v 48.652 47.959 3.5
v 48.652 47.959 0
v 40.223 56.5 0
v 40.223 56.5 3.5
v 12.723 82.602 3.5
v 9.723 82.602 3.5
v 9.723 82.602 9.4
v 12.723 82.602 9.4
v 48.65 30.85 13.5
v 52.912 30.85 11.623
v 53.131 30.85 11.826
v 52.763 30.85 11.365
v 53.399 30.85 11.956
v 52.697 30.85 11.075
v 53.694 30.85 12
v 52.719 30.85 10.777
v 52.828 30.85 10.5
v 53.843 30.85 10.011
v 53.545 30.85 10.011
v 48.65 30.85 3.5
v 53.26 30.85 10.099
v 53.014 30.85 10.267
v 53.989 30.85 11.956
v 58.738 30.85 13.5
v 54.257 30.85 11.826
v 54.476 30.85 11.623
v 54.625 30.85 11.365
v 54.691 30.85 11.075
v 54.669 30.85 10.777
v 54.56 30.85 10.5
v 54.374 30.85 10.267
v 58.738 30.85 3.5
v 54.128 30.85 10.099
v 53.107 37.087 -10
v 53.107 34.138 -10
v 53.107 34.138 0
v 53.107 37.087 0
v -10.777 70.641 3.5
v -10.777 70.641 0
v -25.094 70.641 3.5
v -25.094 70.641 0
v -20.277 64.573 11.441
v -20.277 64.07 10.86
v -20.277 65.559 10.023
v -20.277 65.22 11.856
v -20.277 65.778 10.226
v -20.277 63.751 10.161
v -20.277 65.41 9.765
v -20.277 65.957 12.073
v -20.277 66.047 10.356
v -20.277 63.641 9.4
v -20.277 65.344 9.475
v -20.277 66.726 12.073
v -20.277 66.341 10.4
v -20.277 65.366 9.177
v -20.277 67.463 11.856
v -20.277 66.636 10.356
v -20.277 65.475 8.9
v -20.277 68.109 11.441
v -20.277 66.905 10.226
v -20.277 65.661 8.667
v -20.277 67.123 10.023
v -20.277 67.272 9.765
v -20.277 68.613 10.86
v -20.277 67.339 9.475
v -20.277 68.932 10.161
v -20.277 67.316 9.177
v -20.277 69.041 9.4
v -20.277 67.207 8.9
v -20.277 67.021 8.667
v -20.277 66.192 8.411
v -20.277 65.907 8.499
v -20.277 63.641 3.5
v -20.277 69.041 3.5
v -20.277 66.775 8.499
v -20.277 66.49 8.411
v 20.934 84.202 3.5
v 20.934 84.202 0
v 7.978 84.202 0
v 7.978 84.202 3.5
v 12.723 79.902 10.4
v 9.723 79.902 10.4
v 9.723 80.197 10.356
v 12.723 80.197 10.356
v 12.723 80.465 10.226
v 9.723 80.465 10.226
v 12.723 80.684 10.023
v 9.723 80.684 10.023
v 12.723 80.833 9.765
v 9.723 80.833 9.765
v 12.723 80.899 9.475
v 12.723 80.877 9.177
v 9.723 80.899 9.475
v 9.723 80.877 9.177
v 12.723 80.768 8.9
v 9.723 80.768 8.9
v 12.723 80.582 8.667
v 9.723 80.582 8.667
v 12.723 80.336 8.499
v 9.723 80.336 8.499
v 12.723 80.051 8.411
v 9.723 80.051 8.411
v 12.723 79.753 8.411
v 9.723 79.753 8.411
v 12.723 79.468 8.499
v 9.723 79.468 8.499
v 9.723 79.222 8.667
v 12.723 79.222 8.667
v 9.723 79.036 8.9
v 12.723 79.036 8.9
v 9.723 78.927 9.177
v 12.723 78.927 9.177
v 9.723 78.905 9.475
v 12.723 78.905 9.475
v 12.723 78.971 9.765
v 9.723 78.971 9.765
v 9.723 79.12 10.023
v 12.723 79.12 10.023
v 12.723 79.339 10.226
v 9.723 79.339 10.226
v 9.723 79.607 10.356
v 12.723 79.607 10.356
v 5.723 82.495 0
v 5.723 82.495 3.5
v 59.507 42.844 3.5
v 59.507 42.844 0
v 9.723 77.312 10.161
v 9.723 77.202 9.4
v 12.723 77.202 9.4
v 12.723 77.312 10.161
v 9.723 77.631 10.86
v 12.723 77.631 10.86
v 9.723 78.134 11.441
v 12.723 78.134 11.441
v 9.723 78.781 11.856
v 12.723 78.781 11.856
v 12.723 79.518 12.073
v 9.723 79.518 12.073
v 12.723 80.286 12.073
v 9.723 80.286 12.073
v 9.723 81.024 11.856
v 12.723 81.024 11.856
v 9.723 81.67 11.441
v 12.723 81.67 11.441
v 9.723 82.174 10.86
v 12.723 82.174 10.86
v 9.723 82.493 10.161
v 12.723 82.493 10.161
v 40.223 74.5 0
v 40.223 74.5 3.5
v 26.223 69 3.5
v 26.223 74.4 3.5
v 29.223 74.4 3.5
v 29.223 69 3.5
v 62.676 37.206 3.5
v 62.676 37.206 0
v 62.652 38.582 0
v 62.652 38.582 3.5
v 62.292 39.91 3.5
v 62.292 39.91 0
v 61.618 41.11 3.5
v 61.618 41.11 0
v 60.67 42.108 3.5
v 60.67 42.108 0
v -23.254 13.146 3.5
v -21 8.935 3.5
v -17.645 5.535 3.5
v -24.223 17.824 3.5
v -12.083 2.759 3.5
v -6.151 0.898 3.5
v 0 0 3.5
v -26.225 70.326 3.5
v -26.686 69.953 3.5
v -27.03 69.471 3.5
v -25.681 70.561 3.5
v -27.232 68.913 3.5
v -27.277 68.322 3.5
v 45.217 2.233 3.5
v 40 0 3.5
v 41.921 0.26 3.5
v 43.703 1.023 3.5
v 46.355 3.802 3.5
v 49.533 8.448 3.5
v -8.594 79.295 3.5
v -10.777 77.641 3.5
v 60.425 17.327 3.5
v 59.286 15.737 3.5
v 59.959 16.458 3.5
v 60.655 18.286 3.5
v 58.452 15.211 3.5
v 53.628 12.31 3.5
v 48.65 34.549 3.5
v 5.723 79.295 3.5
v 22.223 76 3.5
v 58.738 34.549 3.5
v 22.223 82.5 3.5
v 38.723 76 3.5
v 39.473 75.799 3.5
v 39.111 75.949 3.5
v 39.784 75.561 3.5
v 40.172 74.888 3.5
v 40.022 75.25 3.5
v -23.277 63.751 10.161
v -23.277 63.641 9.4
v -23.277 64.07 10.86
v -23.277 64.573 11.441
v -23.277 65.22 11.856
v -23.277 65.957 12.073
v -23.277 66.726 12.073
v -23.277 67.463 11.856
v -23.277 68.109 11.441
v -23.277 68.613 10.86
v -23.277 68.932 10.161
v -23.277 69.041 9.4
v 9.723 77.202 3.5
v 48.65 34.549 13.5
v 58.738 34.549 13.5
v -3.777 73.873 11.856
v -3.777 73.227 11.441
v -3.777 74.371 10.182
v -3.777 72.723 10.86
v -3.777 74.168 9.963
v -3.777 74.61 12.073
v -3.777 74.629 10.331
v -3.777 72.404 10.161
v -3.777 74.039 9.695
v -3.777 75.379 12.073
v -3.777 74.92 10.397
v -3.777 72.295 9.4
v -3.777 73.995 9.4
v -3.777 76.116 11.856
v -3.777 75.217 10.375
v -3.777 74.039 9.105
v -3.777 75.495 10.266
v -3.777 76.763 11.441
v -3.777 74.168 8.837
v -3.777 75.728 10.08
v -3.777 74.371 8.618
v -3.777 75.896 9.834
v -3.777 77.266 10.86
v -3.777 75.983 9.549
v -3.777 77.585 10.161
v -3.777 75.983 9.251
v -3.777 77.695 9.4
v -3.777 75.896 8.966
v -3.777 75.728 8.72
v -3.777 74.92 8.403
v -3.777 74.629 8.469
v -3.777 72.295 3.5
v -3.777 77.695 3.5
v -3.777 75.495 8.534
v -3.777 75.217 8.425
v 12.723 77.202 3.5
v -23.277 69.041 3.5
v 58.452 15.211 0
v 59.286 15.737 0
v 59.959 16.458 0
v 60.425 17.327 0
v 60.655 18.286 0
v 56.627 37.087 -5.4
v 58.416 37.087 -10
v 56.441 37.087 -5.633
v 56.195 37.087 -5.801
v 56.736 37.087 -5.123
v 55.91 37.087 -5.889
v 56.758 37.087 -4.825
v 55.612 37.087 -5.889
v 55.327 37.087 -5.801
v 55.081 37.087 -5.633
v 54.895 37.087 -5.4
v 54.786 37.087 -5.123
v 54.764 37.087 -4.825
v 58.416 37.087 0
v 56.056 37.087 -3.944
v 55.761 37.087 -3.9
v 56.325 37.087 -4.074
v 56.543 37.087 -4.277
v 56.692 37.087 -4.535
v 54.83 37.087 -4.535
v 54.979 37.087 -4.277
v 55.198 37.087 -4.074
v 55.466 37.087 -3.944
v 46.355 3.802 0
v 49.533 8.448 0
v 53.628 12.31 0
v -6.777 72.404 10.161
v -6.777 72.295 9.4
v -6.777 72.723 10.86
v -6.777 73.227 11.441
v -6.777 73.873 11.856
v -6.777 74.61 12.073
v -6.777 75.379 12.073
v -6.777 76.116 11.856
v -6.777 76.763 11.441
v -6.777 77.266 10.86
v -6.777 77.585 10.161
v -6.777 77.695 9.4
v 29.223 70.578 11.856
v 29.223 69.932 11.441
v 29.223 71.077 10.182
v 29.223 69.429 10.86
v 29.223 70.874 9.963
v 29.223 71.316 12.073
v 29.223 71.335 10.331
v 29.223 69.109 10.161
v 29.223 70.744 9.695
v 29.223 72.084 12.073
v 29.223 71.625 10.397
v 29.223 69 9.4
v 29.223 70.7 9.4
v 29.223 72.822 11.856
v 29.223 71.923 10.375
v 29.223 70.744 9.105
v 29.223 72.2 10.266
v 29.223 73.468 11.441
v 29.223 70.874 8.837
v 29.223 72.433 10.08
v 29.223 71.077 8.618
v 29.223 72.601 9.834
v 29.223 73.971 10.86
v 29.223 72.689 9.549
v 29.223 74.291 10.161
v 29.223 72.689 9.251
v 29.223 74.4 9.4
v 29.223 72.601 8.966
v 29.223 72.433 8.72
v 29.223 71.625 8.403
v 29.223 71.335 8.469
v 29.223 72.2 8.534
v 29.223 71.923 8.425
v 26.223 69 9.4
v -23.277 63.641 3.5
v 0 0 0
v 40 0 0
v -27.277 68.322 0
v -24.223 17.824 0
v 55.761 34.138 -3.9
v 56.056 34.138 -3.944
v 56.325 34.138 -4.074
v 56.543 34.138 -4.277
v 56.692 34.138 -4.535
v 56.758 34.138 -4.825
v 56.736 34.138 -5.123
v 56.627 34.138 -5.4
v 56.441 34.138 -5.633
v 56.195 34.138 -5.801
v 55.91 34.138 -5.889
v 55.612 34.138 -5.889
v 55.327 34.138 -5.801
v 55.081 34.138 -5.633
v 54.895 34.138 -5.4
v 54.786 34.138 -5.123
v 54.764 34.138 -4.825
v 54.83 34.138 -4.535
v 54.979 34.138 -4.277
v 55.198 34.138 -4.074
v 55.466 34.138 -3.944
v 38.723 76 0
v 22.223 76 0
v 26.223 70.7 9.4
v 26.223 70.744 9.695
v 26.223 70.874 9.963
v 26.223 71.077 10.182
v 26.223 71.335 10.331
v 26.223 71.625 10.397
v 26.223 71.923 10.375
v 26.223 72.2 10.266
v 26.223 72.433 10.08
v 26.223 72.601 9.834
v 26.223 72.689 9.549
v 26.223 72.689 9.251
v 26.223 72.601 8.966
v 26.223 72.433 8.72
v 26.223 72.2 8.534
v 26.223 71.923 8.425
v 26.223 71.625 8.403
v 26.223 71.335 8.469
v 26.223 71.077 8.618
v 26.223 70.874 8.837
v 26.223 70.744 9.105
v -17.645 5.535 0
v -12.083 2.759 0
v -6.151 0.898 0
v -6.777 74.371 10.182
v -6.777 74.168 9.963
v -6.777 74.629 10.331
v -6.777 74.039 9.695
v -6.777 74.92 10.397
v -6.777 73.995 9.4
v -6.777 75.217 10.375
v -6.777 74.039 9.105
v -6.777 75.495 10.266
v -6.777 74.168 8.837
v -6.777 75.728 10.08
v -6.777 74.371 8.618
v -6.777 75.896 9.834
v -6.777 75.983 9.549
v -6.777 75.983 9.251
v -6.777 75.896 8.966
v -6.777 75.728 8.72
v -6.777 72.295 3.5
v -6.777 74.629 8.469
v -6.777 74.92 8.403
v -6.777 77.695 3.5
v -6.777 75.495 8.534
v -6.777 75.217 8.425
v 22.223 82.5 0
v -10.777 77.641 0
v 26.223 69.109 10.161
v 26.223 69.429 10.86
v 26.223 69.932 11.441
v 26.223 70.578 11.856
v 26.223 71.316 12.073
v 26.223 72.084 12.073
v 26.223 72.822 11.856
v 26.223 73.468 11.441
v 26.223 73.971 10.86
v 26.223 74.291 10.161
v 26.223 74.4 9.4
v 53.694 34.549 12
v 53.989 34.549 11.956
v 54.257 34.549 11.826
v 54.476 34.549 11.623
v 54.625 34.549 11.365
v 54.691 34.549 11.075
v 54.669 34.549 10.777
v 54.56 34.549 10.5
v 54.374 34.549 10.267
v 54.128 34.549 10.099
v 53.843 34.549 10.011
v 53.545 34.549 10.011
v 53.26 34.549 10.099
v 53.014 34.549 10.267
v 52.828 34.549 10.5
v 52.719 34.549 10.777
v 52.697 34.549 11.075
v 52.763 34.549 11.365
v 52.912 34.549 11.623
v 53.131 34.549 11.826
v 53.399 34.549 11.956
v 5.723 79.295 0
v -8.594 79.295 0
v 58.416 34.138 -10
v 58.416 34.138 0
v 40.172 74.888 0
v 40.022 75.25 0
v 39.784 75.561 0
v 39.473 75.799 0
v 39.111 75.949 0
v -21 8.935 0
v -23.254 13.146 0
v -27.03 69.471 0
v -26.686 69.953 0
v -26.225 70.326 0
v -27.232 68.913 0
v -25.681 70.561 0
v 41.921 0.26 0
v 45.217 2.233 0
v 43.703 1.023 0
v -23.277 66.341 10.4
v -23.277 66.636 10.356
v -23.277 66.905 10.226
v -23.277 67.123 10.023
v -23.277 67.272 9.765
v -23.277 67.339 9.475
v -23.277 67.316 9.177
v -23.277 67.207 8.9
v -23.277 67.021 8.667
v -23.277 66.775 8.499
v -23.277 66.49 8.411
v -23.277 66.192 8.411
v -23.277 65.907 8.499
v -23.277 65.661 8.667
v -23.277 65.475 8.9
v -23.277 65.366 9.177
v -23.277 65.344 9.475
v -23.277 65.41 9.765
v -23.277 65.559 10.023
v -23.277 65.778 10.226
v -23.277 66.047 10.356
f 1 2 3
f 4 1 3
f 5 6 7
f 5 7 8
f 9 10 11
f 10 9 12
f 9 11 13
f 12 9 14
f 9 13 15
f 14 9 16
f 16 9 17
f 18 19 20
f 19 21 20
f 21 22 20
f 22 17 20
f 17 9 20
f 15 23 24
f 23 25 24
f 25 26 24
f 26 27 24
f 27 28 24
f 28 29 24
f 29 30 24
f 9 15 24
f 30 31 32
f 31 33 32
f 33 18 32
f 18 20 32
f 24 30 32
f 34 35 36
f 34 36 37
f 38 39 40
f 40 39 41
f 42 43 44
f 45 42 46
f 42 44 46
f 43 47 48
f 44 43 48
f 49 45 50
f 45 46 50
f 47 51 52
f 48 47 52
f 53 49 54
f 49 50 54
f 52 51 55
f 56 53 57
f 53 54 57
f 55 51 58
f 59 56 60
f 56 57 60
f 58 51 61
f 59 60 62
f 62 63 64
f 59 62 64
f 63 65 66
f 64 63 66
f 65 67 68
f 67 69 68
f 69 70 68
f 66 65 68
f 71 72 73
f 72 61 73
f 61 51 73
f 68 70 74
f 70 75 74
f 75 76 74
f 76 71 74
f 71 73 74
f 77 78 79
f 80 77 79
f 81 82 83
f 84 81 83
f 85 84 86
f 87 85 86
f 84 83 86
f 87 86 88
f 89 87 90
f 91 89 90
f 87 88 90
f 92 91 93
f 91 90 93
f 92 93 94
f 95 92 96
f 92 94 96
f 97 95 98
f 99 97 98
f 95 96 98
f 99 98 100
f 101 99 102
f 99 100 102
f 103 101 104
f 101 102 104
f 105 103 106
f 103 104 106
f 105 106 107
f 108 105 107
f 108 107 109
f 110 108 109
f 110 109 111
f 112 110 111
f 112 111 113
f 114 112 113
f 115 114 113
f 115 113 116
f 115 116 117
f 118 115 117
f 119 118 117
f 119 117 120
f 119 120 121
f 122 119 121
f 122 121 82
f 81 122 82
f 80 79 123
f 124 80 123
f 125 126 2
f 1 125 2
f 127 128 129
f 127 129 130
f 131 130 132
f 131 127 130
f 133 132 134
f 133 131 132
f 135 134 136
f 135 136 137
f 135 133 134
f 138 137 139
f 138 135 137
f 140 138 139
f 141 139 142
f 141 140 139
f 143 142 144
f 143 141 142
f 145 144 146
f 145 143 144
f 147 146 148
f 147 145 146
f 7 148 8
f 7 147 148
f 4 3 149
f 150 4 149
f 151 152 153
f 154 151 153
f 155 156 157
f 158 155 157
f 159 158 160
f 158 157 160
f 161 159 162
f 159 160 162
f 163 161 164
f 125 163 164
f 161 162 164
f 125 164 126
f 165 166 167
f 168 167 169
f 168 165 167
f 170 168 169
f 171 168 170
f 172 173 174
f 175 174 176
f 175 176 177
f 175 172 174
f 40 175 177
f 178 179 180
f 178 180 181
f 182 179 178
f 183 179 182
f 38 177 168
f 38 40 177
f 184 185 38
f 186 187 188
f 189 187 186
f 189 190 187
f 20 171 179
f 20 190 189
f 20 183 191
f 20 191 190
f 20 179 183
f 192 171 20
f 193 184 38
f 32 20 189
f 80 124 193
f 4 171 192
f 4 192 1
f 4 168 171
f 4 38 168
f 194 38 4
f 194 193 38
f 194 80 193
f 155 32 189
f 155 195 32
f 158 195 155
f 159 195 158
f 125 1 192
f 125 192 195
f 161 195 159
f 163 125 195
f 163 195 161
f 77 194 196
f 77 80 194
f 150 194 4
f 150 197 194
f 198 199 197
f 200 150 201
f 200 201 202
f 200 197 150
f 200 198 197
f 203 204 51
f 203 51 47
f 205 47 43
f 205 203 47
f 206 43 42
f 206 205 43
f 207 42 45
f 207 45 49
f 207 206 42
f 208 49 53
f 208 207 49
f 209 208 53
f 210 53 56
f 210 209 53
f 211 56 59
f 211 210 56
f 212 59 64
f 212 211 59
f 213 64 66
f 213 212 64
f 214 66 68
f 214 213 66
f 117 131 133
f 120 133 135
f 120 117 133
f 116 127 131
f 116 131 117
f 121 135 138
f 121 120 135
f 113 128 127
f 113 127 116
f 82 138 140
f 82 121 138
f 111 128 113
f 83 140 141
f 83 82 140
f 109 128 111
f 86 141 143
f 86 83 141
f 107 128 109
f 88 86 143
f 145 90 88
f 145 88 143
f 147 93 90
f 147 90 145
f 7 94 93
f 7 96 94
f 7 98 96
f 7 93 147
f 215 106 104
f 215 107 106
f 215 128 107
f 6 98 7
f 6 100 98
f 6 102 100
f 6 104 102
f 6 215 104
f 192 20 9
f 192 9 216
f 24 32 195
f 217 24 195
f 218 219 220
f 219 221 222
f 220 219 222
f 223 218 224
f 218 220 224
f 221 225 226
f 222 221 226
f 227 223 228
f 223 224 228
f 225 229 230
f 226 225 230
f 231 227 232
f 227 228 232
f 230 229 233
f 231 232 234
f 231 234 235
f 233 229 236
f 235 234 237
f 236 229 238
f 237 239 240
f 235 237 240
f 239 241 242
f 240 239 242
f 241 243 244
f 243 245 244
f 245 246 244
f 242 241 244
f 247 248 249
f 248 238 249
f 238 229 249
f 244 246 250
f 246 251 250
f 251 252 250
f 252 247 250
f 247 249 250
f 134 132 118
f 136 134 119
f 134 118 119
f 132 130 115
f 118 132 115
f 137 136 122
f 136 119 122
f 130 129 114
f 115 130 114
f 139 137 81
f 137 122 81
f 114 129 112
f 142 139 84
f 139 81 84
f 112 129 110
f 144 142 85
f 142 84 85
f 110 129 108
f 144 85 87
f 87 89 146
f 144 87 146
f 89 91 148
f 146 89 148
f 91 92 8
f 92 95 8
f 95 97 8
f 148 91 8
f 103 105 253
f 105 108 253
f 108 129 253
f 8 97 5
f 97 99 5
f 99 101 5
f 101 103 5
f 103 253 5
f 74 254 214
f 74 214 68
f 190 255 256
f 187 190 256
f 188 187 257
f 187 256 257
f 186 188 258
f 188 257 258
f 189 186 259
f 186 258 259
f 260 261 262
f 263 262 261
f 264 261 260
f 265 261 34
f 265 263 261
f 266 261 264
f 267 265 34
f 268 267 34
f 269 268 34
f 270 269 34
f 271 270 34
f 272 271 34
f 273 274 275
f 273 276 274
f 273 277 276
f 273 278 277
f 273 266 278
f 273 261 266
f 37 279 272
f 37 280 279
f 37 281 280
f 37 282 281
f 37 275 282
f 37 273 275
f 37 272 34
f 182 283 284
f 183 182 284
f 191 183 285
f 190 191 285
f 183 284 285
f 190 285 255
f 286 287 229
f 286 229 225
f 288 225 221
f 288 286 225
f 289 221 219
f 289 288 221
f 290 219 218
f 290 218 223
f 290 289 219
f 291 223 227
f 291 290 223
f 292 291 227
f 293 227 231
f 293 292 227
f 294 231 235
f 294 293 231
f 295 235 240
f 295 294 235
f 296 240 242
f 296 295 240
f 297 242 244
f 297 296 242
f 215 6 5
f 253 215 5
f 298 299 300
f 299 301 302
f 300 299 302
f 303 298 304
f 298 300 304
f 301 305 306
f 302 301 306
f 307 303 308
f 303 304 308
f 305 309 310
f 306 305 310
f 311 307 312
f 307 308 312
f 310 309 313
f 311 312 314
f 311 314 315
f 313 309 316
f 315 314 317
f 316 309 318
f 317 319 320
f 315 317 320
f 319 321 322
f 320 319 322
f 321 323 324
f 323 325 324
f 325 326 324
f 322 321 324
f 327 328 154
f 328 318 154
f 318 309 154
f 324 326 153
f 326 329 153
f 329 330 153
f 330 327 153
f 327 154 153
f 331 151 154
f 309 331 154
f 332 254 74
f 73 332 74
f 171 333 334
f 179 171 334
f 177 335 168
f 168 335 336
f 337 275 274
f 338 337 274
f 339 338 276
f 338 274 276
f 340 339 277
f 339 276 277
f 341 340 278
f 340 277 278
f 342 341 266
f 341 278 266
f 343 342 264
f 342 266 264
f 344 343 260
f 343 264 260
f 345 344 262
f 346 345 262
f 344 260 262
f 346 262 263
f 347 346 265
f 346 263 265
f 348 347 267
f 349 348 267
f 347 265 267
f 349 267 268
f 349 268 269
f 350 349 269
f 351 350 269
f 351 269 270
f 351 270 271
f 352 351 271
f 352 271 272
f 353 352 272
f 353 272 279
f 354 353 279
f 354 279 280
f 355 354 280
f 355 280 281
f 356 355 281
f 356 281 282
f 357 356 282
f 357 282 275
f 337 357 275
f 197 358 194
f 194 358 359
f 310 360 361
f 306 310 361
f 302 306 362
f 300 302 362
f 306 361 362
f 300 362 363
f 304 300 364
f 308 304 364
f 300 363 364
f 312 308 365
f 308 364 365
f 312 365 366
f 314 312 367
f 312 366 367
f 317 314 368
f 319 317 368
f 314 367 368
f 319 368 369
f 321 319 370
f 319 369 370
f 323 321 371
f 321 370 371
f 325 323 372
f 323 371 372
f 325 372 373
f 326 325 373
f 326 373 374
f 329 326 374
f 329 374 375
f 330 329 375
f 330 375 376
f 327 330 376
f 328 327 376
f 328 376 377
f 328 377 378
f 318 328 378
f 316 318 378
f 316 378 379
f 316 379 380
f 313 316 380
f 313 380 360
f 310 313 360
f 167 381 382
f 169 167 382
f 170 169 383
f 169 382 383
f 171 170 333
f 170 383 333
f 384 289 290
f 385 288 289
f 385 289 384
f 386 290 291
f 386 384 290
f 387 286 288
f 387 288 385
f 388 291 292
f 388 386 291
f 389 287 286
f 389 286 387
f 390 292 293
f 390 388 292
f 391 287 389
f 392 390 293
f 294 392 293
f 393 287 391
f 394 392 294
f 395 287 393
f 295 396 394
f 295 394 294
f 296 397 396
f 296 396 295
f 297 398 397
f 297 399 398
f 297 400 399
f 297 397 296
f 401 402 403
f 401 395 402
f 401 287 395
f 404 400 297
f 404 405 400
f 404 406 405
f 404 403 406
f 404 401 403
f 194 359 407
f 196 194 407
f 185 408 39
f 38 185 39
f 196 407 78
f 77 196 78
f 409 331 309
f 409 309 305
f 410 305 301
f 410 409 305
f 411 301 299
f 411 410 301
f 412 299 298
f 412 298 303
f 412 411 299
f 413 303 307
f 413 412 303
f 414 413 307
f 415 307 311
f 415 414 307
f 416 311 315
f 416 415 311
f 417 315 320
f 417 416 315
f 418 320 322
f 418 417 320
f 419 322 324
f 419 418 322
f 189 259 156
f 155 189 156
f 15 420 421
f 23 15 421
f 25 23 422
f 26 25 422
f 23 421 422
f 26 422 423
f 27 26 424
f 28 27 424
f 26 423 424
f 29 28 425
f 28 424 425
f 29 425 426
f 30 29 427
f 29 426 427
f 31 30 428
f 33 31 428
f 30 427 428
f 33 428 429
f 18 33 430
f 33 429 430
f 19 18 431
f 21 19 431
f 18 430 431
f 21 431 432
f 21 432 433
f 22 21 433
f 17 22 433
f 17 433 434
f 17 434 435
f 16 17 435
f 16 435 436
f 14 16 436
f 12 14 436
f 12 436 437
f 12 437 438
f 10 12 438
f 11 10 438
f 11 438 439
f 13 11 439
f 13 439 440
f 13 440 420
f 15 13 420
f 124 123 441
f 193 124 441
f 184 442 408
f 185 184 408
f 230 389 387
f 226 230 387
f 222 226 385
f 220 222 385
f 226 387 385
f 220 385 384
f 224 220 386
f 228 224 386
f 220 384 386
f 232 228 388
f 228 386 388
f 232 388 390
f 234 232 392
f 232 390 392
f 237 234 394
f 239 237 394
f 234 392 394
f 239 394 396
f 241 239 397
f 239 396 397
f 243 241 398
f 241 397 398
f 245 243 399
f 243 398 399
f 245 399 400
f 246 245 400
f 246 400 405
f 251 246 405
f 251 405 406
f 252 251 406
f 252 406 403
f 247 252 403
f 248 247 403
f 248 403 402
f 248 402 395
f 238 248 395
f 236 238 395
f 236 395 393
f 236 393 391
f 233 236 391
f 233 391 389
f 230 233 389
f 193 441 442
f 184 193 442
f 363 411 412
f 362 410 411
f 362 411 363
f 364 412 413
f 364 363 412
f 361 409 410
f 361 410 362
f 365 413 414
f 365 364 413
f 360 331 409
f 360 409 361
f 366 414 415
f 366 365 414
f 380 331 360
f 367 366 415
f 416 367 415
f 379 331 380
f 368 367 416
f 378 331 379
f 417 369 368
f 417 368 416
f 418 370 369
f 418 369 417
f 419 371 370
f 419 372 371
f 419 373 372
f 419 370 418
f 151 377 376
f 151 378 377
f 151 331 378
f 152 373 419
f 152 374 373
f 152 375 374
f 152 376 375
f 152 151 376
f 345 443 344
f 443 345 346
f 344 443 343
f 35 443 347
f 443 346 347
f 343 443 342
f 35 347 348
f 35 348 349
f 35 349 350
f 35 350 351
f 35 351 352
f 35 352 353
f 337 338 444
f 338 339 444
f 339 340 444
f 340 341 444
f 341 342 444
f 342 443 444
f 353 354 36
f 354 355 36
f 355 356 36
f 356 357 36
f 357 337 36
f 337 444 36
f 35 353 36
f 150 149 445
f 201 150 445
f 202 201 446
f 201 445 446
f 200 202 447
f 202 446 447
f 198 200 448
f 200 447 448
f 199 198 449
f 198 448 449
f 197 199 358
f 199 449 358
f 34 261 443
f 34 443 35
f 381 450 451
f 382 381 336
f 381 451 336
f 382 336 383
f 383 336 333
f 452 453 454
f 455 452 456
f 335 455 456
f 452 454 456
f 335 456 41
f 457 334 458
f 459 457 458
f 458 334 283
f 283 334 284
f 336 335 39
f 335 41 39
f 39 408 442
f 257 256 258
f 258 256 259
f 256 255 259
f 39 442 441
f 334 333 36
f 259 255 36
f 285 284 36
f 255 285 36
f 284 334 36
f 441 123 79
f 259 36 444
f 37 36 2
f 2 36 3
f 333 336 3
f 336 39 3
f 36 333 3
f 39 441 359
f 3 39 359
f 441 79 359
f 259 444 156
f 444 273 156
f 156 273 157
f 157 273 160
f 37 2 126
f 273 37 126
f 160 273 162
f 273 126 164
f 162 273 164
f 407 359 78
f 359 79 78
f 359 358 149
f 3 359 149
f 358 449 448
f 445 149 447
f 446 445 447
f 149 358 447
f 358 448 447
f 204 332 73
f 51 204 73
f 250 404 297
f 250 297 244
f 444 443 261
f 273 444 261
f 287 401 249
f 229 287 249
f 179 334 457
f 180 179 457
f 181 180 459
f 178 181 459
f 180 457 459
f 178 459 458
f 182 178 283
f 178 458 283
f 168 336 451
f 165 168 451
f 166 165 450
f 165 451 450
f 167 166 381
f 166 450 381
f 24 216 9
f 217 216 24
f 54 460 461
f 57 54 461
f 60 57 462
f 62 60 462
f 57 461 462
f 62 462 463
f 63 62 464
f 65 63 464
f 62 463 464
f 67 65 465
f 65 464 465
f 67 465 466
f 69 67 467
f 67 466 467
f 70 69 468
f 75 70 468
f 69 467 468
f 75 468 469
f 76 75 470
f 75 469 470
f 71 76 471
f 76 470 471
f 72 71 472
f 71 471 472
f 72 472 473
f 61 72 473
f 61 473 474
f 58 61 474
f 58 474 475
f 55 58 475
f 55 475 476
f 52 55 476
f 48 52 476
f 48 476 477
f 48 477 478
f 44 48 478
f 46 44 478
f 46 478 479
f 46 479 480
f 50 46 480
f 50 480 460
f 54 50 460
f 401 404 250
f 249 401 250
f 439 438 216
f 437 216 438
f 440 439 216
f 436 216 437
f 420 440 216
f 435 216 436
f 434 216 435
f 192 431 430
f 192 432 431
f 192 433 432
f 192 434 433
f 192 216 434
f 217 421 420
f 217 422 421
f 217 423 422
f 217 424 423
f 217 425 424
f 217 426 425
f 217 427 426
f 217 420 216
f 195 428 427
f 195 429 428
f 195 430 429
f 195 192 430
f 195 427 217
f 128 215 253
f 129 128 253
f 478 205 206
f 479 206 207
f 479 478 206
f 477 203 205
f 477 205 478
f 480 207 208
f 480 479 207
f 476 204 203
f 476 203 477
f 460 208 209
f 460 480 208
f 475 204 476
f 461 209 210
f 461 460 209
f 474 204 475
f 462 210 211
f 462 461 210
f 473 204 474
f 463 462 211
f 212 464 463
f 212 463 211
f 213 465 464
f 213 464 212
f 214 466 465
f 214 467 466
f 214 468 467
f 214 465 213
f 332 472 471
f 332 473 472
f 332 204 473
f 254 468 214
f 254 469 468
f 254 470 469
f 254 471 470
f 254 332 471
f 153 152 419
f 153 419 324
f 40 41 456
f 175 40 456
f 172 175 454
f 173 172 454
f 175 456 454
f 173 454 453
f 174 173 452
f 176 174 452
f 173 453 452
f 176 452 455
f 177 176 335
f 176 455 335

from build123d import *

# Parameters (mm, degrees)
BOSS_EXTRUDE1_DEPTH   = 3.5
SKETCH2_W             = 3
SKETCH2_H             = 5.4
BOSS_EXTRUDE2_DEPTH   = 8.6
BOSS_EXTRUDE2_2_DEPTH = 8.6
BOSS_EXTRUDE2_3_DEPTH = 8.6
BOSS_EXTRUDE2_4_DEPTH = 8.6
FILLET1_RADIUS        = 2.7
FILLET1_LENGTH        = 3
SKETCH3_R             = 1
CUT_EXTRUDE1_DEPTH    = 8.6
FILLET2_RADIUS        = 2.7
FILLET2_LENGTH        = 3
FILLET3_RADIUS        = 2.7
FILLET3_LENGTH        = 3
FILLET4_RADIUS        = 2.7
FILLET4_LENGTH        = 3
SKETCH4_R             = 1
CUT_EXTRUDE2_DEPTH    = 8.6
SKETCH5_R             = 1
CUT_EXTRUDE3_DEPTH    = 8.6
SKETCH6_R             = 1
CUT_EXTRUDE4_DEPTH    = 8.6
SKETCH7_W             = 10.088041161
SKETCH7_H             = 3.698948425
BOSS_EXTRUDE3_DEPTH   = 10
SKETCH9_W             = 5.309014269
SKETCH9_H             = 2.949452372
BOSS_EXTRUDE4_DEPTH   = 10
SKETCH10_R            = 1
CUT_EXTRUDE5_DEPTH    = 80.588500555
SKETCH11_R            = 1
CUT_EXTRUDE6_DEPTH    = 36


with BuildPart() as part:
    # Sketch1 → Boss-Extrude1 (new body)
    with BuildSketch(Plane.XY):
        with BuildLine():
            Line((0, 0), (40, 0))
            ThreePointArc((40, 0), (43.702860631, 1.02313584), (46.355122404, 3.802252838))
            ThreePointArc((46.355122404, 3.802252838), (51.476523904, 10.489381564), (58.451995118, 15.210530288))
            ThreePointArc((58.451995118, 15.210530288), (59.958649091, 16.457862213), (60.65507251, 18.285658031))
            Line((60.65507251, 18.285658031), (62.676036693, 37.205672289))
            ThreePointArc((62.676036693, 37.205672289), (61.992272805, 40.530891279), (59.507328539, 42.843825863))
            Line((59.507328539, 42.843825863), (48.652081527, 47.958863722))
            Line((48.652081527, 47.958863722), (40.223025169, 56.5))
            Line((40.223025169, 56.5), (40.223025169, 74.5))
            ThreePointArc((40.223025169, 74.5), (39.783685341, 75.560660172), (38.723025169, 76))
            Line((38.723025169, 76), (22.223025169, 76))
            Line((22.223025169, 76), (22.223025169, 82.5))
            Line((22.223025169, 82.5), (20.933955052, 84.202172899))
            Line((20.933955052, 84.202172899), (7.977740221, 84.202172899))
            Line((7.977740221, 84.202172899), (5.723025169, 82.494657876))
            Line((5.723025169, 82.494657876), (5.723025169, 79.294657876))
            Line((5.723025169, 79.294657876), (-8.593770284, 79.294657876))
            Line((-8.593770284, 79.294657876), (-10.776974831, 77.641298372))
            Line((-10.776974831, 77.641298372), (-10.776974831, 70.641298372))
            Line((-10.776974831, 70.641298372), (-25.093770284, 70.641298372))
            ThreePointArc((-25.093770284, 70.641298372), (-26.686352367, 69.953270921), (-27.276974831, 68.32205525))
            Line((-27.276974831, 68.32205525), (-24.222625674, 17.823537539))
            ThreePointArc((-24.222625674, 17.823537539), (-22.27885064, 10.959272595), (-17.644671543, 5.535180163))
            ThreePointArc((-17.644671543, 5.535180163), (-9.153938091, 1.710530722), (0, 0))
        make_face()
    extrude(amount=BOSS_EXTRUDE1_DEPTH)

    # Sketch7 → Boss-Extrude3 (add)
    with BuildSketch(Plane.XY.offset(3.5)):
        with Locations((53.693991646, 32.699391902)):
            Rectangle(SKETCH7_W, SKETCH7_H)
    extrude(amount=BOSS_EXTRUDE3_DEPTH)

    # Sketch9 → Boss-Extrude4 (add)
    with BuildSketch(Plane(origin=(0, 0, 0), x_dir=(-1, 0, 0), z_dir=(0, 0, -1))):
        with Locations((-55.761247102, 35.612291232)):
            Rectangle(SKETCH9_W, SKETCH9_H)
    extrude(amount=BOSS_EXTRUDE4_DEPTH)

    # Sketch10 → Cut-Extrude5 (cut, through all)
    with BuildSketch(Plane(origin=(0, 37.087017418, 0), x_dir=(1, 0, 0), z_dir=(0, 1, 0))):
        with Locations(Location((55.761247101, 4.9, 0), (0, 0, 270))):
            Circle(SKETCH10_R)
    extrude(amount=-CUT_EXTRUDE5_DEPTH, mode=Mode.SUBTRACT)

    # Sketch11 → Cut-Extrude6 (cut)
    with BuildSketch(Plane(origin=(0, 34.548866114, 0), x_dir=(1, 0, 0), z_dir=(0, 1, 0))):
        with Locations(Location((53.693991645, -11, 0), (0, 0, 270))):
            Circle(SKETCH11_R)
    extrude(amount=-CUT_EXTRUDE6_DEPTH, mode=Mode.SUBTRACT)


with BuildPart() as body_2:
    # Sketch2 → Boss-Extrude2 (new body)
    with BuildSketch(Plane.XY.offset(3.5)):
        with Locations((-21.776974831, 66.341298372)):
            Rectangle(SKETCH2_W, SKETCH2_H)
    extrude(amount=BOSS_EXTRUDE2_DEPTH)

    # Fillet1: full round fillet: the end face becomes a half cylinder, R = half its width
    fillet1_face = Plane((-21.776974831, 66.341298372, 12.1), x_dir=(-1, 0, 0), z_dir=(0, 0, 1))  # on the end face: x along it, z out of the body
    fillet1_slab = fillet1_face.offset(-FILLET1_RADIUS / 2) * Box(FILLET1_LENGTH, 2 * FILLET1_RADIUS, FILLET1_RADIUS, mode=Mode.PRIVATE)  # the body's end, R deep
    fillet1_round = Plane((-21.776974831, 66.341298372, 9.4), x_dir=(0, 0, 1), z_dir=(-1, 0, 0)) * Cylinder(FILLET1_RADIUS, FILLET1_LENGTH, mode=Mode.PRIVATE)  # its axis R under the face
    add(fillet1_slab - fillet1_round, mode=Mode.SUBTRACT)

    # Sketch3 → Cut-Extrude1 (cut)
    with BuildSketch(Plane.ZY.offset(23.276974831)):
        with Locations((9.4, 66.341298372)):
            Circle(SKETCH3_R)
    extrude(amount=-CUT_EXTRUDE1_DEPTH, mode=Mode.SUBTRACT)


with BuildPart() as body_3:
    # Sketch2 → Boss-Extrude2 2 (new body)
    with BuildSketch(Plane.XY.offset(3.5)):
        with Locations((-5.276974831, 74.994657876)):
            Rectangle(SKETCH2_W, SKETCH2_H)
    extrude(amount=BOSS_EXTRUDE2_2_DEPTH)

    # Fillet2: full round fillet: the end face becomes a half cylinder, R = half its width
    fillet2_face = Plane((-5.276974831, 74.994657876, 12.1), x_dir=(-1, 0, 0), z_dir=(0, 0, 1))  # on the end face: x along it, z out of the body
    fillet2_slab = fillet2_face.offset(-FILLET2_RADIUS / 2) * Box(FILLET2_LENGTH, 2 * FILLET2_RADIUS, FILLET2_RADIUS, mode=Mode.PRIVATE)  # the body's end, R deep
    fillet2_round = Plane((-5.276974831, 74.994657876, 9.4), x_dir=(0, 0, 1), z_dir=(-1, 0, 0)) * Cylinder(FILLET2_RADIUS, FILLET2_LENGTH, mode=Mode.PRIVATE)  # its axis R under the face
    add(fillet2_slab - fillet2_round, mode=Mode.SUBTRACT)

    # Sketch4 → Cut-Extrude2 (cut)
    with BuildSketch(Plane.ZY.offset(6.776974831)):
        with Locations(Location((9.4, 74.994657876, 0), (0, 0, 270))):
            Circle(SKETCH4_R)
    extrude(amount=-CUT_EXTRUDE2_DEPTH, mode=Mode.SUBTRACT)


with BuildPart() as body_4:
    # Sketch2 → Boss-Extrude2 3 (new body)
    with BuildSketch(Plane.XY.offset(3.5)):
        with Locations((11.223025169, 79.902172899)):
            Rectangle(SKETCH2_W, SKETCH2_H)
    extrude(amount=BOSS_EXTRUDE2_3_DEPTH)

    # Fillet3: full round fillet: the end face becomes a half cylinder, R = half its width
    fillet3_face = Plane((11.223025169, 79.902172899, 12.1), x_dir=(-1, 0, 0), z_dir=(0, 0, 1))  # on the end face: x along it, z out of the body
    fillet3_slab = fillet3_face.offset(-FILLET3_RADIUS / 2) * Box(FILLET3_LENGTH, 2 * FILLET3_RADIUS, FILLET3_RADIUS, mode=Mode.PRIVATE)  # the body's end, R deep
    fillet3_round = Plane((11.223025169, 79.902172899, 9.4), x_dir=(0, 0, 1), z_dir=(-1, 0, 0)) * Cylinder(FILLET3_RADIUS, FILLET3_LENGTH, mode=Mode.PRIVATE)  # its axis R under the face
    add(fillet3_slab - fillet3_round, mode=Mode.SUBTRACT)

    # Sketch5 → Cut-Extrude3 (cut)
    with BuildSketch(Plane.ZY.offset(-9.723025169)):
        with Locations((9.4, 79.902172899)):
            Circle(SKETCH5_R)
    extrude(amount=-CUT_EXTRUDE3_DEPTH, mode=Mode.SUBTRACT)


with BuildPart() as body_5:
    # Sketch2 → Boss-Extrude2 4 (new body)
    with BuildSketch(Plane.XY.offset(3.5)):
        with Locations((27.723025169, 71.7)):
            Rectangle(SKETCH2_W, SKETCH2_H)
    extrude(amount=BOSS_EXTRUDE2_4_DEPTH)

    # Fillet4: full round fillet: the end face becomes a half cylinder, R = half its width
    fillet4_face = Plane((27.723025169, 71.7, 12.1), x_dir=(-1, 0, 0), z_dir=(0, 0, 1))  # on the end face: x along it, z out of the body
    fillet4_slab = fillet4_face.offset(-FILLET4_RADIUS / 2) * Box(FILLET4_LENGTH, 2 * FILLET4_RADIUS, FILLET4_RADIUS, mode=Mode.PRIVATE)  # the body's end, R deep
    fillet4_round = Plane((27.723025169, 71.7, 9.4), x_dir=(0, 0, 1), z_dir=(-1, 0, 0)) * Cylinder(FILLET4_RADIUS, FILLET4_LENGTH, mode=Mode.PRIVATE)  # its axis R under the face
    add(fillet4_slab - fillet4_round, mode=Mode.SUBTRACT)

    # Sketch6 → Cut-Extrude4 (cut)
    with BuildSketch(Plane.ZY.offset(-26.223025169)):
        with Locations(Location((9.4, 71.7, 0), (0, 0, 270))):
            Circle(SKETCH6_R)
    extrude(amount=-CUT_EXTRUDE4_DEPTH, mode=Mode.SUBTRACT)


solid = Compound([part.part, body_2.part, body_3.part, body_4.part, body_5.part])
